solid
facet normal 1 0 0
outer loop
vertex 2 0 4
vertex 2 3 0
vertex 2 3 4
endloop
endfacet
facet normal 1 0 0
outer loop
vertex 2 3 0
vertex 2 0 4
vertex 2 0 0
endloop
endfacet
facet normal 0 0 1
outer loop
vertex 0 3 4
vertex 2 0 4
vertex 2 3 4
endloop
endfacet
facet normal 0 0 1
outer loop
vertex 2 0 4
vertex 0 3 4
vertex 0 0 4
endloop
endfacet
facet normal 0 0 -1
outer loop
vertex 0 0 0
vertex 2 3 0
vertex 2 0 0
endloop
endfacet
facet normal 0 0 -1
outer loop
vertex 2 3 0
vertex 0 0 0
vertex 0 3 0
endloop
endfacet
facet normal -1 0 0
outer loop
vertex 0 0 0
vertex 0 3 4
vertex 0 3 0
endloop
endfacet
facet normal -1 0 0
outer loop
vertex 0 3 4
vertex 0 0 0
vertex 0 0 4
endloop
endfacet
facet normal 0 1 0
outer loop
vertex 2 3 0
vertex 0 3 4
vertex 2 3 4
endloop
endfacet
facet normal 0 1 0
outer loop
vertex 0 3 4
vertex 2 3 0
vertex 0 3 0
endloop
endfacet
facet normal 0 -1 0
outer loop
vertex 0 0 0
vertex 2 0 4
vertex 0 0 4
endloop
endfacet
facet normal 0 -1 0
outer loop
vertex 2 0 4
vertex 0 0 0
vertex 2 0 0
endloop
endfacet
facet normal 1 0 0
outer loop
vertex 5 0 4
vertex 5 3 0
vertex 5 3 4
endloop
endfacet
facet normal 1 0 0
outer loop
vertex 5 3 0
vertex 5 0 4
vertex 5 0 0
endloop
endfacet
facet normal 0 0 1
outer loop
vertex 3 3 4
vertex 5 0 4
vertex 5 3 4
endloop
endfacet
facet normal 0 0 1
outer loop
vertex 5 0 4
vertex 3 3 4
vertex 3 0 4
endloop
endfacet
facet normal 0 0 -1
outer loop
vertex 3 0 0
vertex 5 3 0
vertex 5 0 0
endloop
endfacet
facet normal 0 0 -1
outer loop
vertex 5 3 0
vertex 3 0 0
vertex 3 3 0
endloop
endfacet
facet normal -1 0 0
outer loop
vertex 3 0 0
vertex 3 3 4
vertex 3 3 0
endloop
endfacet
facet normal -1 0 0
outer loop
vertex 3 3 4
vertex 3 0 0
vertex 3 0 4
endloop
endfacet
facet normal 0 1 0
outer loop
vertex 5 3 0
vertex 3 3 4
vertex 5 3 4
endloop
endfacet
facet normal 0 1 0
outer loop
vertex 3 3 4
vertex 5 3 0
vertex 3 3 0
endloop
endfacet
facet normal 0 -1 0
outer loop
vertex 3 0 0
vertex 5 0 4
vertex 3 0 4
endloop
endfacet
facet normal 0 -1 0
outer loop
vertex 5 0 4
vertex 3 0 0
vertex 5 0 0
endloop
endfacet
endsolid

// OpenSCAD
// See http://en.wikibooks.org/wiki/OpenSCAD_User_Manual

cube([2,3,4]);

translate([3,0,0]) {
  cube([2,3,4]);
}
